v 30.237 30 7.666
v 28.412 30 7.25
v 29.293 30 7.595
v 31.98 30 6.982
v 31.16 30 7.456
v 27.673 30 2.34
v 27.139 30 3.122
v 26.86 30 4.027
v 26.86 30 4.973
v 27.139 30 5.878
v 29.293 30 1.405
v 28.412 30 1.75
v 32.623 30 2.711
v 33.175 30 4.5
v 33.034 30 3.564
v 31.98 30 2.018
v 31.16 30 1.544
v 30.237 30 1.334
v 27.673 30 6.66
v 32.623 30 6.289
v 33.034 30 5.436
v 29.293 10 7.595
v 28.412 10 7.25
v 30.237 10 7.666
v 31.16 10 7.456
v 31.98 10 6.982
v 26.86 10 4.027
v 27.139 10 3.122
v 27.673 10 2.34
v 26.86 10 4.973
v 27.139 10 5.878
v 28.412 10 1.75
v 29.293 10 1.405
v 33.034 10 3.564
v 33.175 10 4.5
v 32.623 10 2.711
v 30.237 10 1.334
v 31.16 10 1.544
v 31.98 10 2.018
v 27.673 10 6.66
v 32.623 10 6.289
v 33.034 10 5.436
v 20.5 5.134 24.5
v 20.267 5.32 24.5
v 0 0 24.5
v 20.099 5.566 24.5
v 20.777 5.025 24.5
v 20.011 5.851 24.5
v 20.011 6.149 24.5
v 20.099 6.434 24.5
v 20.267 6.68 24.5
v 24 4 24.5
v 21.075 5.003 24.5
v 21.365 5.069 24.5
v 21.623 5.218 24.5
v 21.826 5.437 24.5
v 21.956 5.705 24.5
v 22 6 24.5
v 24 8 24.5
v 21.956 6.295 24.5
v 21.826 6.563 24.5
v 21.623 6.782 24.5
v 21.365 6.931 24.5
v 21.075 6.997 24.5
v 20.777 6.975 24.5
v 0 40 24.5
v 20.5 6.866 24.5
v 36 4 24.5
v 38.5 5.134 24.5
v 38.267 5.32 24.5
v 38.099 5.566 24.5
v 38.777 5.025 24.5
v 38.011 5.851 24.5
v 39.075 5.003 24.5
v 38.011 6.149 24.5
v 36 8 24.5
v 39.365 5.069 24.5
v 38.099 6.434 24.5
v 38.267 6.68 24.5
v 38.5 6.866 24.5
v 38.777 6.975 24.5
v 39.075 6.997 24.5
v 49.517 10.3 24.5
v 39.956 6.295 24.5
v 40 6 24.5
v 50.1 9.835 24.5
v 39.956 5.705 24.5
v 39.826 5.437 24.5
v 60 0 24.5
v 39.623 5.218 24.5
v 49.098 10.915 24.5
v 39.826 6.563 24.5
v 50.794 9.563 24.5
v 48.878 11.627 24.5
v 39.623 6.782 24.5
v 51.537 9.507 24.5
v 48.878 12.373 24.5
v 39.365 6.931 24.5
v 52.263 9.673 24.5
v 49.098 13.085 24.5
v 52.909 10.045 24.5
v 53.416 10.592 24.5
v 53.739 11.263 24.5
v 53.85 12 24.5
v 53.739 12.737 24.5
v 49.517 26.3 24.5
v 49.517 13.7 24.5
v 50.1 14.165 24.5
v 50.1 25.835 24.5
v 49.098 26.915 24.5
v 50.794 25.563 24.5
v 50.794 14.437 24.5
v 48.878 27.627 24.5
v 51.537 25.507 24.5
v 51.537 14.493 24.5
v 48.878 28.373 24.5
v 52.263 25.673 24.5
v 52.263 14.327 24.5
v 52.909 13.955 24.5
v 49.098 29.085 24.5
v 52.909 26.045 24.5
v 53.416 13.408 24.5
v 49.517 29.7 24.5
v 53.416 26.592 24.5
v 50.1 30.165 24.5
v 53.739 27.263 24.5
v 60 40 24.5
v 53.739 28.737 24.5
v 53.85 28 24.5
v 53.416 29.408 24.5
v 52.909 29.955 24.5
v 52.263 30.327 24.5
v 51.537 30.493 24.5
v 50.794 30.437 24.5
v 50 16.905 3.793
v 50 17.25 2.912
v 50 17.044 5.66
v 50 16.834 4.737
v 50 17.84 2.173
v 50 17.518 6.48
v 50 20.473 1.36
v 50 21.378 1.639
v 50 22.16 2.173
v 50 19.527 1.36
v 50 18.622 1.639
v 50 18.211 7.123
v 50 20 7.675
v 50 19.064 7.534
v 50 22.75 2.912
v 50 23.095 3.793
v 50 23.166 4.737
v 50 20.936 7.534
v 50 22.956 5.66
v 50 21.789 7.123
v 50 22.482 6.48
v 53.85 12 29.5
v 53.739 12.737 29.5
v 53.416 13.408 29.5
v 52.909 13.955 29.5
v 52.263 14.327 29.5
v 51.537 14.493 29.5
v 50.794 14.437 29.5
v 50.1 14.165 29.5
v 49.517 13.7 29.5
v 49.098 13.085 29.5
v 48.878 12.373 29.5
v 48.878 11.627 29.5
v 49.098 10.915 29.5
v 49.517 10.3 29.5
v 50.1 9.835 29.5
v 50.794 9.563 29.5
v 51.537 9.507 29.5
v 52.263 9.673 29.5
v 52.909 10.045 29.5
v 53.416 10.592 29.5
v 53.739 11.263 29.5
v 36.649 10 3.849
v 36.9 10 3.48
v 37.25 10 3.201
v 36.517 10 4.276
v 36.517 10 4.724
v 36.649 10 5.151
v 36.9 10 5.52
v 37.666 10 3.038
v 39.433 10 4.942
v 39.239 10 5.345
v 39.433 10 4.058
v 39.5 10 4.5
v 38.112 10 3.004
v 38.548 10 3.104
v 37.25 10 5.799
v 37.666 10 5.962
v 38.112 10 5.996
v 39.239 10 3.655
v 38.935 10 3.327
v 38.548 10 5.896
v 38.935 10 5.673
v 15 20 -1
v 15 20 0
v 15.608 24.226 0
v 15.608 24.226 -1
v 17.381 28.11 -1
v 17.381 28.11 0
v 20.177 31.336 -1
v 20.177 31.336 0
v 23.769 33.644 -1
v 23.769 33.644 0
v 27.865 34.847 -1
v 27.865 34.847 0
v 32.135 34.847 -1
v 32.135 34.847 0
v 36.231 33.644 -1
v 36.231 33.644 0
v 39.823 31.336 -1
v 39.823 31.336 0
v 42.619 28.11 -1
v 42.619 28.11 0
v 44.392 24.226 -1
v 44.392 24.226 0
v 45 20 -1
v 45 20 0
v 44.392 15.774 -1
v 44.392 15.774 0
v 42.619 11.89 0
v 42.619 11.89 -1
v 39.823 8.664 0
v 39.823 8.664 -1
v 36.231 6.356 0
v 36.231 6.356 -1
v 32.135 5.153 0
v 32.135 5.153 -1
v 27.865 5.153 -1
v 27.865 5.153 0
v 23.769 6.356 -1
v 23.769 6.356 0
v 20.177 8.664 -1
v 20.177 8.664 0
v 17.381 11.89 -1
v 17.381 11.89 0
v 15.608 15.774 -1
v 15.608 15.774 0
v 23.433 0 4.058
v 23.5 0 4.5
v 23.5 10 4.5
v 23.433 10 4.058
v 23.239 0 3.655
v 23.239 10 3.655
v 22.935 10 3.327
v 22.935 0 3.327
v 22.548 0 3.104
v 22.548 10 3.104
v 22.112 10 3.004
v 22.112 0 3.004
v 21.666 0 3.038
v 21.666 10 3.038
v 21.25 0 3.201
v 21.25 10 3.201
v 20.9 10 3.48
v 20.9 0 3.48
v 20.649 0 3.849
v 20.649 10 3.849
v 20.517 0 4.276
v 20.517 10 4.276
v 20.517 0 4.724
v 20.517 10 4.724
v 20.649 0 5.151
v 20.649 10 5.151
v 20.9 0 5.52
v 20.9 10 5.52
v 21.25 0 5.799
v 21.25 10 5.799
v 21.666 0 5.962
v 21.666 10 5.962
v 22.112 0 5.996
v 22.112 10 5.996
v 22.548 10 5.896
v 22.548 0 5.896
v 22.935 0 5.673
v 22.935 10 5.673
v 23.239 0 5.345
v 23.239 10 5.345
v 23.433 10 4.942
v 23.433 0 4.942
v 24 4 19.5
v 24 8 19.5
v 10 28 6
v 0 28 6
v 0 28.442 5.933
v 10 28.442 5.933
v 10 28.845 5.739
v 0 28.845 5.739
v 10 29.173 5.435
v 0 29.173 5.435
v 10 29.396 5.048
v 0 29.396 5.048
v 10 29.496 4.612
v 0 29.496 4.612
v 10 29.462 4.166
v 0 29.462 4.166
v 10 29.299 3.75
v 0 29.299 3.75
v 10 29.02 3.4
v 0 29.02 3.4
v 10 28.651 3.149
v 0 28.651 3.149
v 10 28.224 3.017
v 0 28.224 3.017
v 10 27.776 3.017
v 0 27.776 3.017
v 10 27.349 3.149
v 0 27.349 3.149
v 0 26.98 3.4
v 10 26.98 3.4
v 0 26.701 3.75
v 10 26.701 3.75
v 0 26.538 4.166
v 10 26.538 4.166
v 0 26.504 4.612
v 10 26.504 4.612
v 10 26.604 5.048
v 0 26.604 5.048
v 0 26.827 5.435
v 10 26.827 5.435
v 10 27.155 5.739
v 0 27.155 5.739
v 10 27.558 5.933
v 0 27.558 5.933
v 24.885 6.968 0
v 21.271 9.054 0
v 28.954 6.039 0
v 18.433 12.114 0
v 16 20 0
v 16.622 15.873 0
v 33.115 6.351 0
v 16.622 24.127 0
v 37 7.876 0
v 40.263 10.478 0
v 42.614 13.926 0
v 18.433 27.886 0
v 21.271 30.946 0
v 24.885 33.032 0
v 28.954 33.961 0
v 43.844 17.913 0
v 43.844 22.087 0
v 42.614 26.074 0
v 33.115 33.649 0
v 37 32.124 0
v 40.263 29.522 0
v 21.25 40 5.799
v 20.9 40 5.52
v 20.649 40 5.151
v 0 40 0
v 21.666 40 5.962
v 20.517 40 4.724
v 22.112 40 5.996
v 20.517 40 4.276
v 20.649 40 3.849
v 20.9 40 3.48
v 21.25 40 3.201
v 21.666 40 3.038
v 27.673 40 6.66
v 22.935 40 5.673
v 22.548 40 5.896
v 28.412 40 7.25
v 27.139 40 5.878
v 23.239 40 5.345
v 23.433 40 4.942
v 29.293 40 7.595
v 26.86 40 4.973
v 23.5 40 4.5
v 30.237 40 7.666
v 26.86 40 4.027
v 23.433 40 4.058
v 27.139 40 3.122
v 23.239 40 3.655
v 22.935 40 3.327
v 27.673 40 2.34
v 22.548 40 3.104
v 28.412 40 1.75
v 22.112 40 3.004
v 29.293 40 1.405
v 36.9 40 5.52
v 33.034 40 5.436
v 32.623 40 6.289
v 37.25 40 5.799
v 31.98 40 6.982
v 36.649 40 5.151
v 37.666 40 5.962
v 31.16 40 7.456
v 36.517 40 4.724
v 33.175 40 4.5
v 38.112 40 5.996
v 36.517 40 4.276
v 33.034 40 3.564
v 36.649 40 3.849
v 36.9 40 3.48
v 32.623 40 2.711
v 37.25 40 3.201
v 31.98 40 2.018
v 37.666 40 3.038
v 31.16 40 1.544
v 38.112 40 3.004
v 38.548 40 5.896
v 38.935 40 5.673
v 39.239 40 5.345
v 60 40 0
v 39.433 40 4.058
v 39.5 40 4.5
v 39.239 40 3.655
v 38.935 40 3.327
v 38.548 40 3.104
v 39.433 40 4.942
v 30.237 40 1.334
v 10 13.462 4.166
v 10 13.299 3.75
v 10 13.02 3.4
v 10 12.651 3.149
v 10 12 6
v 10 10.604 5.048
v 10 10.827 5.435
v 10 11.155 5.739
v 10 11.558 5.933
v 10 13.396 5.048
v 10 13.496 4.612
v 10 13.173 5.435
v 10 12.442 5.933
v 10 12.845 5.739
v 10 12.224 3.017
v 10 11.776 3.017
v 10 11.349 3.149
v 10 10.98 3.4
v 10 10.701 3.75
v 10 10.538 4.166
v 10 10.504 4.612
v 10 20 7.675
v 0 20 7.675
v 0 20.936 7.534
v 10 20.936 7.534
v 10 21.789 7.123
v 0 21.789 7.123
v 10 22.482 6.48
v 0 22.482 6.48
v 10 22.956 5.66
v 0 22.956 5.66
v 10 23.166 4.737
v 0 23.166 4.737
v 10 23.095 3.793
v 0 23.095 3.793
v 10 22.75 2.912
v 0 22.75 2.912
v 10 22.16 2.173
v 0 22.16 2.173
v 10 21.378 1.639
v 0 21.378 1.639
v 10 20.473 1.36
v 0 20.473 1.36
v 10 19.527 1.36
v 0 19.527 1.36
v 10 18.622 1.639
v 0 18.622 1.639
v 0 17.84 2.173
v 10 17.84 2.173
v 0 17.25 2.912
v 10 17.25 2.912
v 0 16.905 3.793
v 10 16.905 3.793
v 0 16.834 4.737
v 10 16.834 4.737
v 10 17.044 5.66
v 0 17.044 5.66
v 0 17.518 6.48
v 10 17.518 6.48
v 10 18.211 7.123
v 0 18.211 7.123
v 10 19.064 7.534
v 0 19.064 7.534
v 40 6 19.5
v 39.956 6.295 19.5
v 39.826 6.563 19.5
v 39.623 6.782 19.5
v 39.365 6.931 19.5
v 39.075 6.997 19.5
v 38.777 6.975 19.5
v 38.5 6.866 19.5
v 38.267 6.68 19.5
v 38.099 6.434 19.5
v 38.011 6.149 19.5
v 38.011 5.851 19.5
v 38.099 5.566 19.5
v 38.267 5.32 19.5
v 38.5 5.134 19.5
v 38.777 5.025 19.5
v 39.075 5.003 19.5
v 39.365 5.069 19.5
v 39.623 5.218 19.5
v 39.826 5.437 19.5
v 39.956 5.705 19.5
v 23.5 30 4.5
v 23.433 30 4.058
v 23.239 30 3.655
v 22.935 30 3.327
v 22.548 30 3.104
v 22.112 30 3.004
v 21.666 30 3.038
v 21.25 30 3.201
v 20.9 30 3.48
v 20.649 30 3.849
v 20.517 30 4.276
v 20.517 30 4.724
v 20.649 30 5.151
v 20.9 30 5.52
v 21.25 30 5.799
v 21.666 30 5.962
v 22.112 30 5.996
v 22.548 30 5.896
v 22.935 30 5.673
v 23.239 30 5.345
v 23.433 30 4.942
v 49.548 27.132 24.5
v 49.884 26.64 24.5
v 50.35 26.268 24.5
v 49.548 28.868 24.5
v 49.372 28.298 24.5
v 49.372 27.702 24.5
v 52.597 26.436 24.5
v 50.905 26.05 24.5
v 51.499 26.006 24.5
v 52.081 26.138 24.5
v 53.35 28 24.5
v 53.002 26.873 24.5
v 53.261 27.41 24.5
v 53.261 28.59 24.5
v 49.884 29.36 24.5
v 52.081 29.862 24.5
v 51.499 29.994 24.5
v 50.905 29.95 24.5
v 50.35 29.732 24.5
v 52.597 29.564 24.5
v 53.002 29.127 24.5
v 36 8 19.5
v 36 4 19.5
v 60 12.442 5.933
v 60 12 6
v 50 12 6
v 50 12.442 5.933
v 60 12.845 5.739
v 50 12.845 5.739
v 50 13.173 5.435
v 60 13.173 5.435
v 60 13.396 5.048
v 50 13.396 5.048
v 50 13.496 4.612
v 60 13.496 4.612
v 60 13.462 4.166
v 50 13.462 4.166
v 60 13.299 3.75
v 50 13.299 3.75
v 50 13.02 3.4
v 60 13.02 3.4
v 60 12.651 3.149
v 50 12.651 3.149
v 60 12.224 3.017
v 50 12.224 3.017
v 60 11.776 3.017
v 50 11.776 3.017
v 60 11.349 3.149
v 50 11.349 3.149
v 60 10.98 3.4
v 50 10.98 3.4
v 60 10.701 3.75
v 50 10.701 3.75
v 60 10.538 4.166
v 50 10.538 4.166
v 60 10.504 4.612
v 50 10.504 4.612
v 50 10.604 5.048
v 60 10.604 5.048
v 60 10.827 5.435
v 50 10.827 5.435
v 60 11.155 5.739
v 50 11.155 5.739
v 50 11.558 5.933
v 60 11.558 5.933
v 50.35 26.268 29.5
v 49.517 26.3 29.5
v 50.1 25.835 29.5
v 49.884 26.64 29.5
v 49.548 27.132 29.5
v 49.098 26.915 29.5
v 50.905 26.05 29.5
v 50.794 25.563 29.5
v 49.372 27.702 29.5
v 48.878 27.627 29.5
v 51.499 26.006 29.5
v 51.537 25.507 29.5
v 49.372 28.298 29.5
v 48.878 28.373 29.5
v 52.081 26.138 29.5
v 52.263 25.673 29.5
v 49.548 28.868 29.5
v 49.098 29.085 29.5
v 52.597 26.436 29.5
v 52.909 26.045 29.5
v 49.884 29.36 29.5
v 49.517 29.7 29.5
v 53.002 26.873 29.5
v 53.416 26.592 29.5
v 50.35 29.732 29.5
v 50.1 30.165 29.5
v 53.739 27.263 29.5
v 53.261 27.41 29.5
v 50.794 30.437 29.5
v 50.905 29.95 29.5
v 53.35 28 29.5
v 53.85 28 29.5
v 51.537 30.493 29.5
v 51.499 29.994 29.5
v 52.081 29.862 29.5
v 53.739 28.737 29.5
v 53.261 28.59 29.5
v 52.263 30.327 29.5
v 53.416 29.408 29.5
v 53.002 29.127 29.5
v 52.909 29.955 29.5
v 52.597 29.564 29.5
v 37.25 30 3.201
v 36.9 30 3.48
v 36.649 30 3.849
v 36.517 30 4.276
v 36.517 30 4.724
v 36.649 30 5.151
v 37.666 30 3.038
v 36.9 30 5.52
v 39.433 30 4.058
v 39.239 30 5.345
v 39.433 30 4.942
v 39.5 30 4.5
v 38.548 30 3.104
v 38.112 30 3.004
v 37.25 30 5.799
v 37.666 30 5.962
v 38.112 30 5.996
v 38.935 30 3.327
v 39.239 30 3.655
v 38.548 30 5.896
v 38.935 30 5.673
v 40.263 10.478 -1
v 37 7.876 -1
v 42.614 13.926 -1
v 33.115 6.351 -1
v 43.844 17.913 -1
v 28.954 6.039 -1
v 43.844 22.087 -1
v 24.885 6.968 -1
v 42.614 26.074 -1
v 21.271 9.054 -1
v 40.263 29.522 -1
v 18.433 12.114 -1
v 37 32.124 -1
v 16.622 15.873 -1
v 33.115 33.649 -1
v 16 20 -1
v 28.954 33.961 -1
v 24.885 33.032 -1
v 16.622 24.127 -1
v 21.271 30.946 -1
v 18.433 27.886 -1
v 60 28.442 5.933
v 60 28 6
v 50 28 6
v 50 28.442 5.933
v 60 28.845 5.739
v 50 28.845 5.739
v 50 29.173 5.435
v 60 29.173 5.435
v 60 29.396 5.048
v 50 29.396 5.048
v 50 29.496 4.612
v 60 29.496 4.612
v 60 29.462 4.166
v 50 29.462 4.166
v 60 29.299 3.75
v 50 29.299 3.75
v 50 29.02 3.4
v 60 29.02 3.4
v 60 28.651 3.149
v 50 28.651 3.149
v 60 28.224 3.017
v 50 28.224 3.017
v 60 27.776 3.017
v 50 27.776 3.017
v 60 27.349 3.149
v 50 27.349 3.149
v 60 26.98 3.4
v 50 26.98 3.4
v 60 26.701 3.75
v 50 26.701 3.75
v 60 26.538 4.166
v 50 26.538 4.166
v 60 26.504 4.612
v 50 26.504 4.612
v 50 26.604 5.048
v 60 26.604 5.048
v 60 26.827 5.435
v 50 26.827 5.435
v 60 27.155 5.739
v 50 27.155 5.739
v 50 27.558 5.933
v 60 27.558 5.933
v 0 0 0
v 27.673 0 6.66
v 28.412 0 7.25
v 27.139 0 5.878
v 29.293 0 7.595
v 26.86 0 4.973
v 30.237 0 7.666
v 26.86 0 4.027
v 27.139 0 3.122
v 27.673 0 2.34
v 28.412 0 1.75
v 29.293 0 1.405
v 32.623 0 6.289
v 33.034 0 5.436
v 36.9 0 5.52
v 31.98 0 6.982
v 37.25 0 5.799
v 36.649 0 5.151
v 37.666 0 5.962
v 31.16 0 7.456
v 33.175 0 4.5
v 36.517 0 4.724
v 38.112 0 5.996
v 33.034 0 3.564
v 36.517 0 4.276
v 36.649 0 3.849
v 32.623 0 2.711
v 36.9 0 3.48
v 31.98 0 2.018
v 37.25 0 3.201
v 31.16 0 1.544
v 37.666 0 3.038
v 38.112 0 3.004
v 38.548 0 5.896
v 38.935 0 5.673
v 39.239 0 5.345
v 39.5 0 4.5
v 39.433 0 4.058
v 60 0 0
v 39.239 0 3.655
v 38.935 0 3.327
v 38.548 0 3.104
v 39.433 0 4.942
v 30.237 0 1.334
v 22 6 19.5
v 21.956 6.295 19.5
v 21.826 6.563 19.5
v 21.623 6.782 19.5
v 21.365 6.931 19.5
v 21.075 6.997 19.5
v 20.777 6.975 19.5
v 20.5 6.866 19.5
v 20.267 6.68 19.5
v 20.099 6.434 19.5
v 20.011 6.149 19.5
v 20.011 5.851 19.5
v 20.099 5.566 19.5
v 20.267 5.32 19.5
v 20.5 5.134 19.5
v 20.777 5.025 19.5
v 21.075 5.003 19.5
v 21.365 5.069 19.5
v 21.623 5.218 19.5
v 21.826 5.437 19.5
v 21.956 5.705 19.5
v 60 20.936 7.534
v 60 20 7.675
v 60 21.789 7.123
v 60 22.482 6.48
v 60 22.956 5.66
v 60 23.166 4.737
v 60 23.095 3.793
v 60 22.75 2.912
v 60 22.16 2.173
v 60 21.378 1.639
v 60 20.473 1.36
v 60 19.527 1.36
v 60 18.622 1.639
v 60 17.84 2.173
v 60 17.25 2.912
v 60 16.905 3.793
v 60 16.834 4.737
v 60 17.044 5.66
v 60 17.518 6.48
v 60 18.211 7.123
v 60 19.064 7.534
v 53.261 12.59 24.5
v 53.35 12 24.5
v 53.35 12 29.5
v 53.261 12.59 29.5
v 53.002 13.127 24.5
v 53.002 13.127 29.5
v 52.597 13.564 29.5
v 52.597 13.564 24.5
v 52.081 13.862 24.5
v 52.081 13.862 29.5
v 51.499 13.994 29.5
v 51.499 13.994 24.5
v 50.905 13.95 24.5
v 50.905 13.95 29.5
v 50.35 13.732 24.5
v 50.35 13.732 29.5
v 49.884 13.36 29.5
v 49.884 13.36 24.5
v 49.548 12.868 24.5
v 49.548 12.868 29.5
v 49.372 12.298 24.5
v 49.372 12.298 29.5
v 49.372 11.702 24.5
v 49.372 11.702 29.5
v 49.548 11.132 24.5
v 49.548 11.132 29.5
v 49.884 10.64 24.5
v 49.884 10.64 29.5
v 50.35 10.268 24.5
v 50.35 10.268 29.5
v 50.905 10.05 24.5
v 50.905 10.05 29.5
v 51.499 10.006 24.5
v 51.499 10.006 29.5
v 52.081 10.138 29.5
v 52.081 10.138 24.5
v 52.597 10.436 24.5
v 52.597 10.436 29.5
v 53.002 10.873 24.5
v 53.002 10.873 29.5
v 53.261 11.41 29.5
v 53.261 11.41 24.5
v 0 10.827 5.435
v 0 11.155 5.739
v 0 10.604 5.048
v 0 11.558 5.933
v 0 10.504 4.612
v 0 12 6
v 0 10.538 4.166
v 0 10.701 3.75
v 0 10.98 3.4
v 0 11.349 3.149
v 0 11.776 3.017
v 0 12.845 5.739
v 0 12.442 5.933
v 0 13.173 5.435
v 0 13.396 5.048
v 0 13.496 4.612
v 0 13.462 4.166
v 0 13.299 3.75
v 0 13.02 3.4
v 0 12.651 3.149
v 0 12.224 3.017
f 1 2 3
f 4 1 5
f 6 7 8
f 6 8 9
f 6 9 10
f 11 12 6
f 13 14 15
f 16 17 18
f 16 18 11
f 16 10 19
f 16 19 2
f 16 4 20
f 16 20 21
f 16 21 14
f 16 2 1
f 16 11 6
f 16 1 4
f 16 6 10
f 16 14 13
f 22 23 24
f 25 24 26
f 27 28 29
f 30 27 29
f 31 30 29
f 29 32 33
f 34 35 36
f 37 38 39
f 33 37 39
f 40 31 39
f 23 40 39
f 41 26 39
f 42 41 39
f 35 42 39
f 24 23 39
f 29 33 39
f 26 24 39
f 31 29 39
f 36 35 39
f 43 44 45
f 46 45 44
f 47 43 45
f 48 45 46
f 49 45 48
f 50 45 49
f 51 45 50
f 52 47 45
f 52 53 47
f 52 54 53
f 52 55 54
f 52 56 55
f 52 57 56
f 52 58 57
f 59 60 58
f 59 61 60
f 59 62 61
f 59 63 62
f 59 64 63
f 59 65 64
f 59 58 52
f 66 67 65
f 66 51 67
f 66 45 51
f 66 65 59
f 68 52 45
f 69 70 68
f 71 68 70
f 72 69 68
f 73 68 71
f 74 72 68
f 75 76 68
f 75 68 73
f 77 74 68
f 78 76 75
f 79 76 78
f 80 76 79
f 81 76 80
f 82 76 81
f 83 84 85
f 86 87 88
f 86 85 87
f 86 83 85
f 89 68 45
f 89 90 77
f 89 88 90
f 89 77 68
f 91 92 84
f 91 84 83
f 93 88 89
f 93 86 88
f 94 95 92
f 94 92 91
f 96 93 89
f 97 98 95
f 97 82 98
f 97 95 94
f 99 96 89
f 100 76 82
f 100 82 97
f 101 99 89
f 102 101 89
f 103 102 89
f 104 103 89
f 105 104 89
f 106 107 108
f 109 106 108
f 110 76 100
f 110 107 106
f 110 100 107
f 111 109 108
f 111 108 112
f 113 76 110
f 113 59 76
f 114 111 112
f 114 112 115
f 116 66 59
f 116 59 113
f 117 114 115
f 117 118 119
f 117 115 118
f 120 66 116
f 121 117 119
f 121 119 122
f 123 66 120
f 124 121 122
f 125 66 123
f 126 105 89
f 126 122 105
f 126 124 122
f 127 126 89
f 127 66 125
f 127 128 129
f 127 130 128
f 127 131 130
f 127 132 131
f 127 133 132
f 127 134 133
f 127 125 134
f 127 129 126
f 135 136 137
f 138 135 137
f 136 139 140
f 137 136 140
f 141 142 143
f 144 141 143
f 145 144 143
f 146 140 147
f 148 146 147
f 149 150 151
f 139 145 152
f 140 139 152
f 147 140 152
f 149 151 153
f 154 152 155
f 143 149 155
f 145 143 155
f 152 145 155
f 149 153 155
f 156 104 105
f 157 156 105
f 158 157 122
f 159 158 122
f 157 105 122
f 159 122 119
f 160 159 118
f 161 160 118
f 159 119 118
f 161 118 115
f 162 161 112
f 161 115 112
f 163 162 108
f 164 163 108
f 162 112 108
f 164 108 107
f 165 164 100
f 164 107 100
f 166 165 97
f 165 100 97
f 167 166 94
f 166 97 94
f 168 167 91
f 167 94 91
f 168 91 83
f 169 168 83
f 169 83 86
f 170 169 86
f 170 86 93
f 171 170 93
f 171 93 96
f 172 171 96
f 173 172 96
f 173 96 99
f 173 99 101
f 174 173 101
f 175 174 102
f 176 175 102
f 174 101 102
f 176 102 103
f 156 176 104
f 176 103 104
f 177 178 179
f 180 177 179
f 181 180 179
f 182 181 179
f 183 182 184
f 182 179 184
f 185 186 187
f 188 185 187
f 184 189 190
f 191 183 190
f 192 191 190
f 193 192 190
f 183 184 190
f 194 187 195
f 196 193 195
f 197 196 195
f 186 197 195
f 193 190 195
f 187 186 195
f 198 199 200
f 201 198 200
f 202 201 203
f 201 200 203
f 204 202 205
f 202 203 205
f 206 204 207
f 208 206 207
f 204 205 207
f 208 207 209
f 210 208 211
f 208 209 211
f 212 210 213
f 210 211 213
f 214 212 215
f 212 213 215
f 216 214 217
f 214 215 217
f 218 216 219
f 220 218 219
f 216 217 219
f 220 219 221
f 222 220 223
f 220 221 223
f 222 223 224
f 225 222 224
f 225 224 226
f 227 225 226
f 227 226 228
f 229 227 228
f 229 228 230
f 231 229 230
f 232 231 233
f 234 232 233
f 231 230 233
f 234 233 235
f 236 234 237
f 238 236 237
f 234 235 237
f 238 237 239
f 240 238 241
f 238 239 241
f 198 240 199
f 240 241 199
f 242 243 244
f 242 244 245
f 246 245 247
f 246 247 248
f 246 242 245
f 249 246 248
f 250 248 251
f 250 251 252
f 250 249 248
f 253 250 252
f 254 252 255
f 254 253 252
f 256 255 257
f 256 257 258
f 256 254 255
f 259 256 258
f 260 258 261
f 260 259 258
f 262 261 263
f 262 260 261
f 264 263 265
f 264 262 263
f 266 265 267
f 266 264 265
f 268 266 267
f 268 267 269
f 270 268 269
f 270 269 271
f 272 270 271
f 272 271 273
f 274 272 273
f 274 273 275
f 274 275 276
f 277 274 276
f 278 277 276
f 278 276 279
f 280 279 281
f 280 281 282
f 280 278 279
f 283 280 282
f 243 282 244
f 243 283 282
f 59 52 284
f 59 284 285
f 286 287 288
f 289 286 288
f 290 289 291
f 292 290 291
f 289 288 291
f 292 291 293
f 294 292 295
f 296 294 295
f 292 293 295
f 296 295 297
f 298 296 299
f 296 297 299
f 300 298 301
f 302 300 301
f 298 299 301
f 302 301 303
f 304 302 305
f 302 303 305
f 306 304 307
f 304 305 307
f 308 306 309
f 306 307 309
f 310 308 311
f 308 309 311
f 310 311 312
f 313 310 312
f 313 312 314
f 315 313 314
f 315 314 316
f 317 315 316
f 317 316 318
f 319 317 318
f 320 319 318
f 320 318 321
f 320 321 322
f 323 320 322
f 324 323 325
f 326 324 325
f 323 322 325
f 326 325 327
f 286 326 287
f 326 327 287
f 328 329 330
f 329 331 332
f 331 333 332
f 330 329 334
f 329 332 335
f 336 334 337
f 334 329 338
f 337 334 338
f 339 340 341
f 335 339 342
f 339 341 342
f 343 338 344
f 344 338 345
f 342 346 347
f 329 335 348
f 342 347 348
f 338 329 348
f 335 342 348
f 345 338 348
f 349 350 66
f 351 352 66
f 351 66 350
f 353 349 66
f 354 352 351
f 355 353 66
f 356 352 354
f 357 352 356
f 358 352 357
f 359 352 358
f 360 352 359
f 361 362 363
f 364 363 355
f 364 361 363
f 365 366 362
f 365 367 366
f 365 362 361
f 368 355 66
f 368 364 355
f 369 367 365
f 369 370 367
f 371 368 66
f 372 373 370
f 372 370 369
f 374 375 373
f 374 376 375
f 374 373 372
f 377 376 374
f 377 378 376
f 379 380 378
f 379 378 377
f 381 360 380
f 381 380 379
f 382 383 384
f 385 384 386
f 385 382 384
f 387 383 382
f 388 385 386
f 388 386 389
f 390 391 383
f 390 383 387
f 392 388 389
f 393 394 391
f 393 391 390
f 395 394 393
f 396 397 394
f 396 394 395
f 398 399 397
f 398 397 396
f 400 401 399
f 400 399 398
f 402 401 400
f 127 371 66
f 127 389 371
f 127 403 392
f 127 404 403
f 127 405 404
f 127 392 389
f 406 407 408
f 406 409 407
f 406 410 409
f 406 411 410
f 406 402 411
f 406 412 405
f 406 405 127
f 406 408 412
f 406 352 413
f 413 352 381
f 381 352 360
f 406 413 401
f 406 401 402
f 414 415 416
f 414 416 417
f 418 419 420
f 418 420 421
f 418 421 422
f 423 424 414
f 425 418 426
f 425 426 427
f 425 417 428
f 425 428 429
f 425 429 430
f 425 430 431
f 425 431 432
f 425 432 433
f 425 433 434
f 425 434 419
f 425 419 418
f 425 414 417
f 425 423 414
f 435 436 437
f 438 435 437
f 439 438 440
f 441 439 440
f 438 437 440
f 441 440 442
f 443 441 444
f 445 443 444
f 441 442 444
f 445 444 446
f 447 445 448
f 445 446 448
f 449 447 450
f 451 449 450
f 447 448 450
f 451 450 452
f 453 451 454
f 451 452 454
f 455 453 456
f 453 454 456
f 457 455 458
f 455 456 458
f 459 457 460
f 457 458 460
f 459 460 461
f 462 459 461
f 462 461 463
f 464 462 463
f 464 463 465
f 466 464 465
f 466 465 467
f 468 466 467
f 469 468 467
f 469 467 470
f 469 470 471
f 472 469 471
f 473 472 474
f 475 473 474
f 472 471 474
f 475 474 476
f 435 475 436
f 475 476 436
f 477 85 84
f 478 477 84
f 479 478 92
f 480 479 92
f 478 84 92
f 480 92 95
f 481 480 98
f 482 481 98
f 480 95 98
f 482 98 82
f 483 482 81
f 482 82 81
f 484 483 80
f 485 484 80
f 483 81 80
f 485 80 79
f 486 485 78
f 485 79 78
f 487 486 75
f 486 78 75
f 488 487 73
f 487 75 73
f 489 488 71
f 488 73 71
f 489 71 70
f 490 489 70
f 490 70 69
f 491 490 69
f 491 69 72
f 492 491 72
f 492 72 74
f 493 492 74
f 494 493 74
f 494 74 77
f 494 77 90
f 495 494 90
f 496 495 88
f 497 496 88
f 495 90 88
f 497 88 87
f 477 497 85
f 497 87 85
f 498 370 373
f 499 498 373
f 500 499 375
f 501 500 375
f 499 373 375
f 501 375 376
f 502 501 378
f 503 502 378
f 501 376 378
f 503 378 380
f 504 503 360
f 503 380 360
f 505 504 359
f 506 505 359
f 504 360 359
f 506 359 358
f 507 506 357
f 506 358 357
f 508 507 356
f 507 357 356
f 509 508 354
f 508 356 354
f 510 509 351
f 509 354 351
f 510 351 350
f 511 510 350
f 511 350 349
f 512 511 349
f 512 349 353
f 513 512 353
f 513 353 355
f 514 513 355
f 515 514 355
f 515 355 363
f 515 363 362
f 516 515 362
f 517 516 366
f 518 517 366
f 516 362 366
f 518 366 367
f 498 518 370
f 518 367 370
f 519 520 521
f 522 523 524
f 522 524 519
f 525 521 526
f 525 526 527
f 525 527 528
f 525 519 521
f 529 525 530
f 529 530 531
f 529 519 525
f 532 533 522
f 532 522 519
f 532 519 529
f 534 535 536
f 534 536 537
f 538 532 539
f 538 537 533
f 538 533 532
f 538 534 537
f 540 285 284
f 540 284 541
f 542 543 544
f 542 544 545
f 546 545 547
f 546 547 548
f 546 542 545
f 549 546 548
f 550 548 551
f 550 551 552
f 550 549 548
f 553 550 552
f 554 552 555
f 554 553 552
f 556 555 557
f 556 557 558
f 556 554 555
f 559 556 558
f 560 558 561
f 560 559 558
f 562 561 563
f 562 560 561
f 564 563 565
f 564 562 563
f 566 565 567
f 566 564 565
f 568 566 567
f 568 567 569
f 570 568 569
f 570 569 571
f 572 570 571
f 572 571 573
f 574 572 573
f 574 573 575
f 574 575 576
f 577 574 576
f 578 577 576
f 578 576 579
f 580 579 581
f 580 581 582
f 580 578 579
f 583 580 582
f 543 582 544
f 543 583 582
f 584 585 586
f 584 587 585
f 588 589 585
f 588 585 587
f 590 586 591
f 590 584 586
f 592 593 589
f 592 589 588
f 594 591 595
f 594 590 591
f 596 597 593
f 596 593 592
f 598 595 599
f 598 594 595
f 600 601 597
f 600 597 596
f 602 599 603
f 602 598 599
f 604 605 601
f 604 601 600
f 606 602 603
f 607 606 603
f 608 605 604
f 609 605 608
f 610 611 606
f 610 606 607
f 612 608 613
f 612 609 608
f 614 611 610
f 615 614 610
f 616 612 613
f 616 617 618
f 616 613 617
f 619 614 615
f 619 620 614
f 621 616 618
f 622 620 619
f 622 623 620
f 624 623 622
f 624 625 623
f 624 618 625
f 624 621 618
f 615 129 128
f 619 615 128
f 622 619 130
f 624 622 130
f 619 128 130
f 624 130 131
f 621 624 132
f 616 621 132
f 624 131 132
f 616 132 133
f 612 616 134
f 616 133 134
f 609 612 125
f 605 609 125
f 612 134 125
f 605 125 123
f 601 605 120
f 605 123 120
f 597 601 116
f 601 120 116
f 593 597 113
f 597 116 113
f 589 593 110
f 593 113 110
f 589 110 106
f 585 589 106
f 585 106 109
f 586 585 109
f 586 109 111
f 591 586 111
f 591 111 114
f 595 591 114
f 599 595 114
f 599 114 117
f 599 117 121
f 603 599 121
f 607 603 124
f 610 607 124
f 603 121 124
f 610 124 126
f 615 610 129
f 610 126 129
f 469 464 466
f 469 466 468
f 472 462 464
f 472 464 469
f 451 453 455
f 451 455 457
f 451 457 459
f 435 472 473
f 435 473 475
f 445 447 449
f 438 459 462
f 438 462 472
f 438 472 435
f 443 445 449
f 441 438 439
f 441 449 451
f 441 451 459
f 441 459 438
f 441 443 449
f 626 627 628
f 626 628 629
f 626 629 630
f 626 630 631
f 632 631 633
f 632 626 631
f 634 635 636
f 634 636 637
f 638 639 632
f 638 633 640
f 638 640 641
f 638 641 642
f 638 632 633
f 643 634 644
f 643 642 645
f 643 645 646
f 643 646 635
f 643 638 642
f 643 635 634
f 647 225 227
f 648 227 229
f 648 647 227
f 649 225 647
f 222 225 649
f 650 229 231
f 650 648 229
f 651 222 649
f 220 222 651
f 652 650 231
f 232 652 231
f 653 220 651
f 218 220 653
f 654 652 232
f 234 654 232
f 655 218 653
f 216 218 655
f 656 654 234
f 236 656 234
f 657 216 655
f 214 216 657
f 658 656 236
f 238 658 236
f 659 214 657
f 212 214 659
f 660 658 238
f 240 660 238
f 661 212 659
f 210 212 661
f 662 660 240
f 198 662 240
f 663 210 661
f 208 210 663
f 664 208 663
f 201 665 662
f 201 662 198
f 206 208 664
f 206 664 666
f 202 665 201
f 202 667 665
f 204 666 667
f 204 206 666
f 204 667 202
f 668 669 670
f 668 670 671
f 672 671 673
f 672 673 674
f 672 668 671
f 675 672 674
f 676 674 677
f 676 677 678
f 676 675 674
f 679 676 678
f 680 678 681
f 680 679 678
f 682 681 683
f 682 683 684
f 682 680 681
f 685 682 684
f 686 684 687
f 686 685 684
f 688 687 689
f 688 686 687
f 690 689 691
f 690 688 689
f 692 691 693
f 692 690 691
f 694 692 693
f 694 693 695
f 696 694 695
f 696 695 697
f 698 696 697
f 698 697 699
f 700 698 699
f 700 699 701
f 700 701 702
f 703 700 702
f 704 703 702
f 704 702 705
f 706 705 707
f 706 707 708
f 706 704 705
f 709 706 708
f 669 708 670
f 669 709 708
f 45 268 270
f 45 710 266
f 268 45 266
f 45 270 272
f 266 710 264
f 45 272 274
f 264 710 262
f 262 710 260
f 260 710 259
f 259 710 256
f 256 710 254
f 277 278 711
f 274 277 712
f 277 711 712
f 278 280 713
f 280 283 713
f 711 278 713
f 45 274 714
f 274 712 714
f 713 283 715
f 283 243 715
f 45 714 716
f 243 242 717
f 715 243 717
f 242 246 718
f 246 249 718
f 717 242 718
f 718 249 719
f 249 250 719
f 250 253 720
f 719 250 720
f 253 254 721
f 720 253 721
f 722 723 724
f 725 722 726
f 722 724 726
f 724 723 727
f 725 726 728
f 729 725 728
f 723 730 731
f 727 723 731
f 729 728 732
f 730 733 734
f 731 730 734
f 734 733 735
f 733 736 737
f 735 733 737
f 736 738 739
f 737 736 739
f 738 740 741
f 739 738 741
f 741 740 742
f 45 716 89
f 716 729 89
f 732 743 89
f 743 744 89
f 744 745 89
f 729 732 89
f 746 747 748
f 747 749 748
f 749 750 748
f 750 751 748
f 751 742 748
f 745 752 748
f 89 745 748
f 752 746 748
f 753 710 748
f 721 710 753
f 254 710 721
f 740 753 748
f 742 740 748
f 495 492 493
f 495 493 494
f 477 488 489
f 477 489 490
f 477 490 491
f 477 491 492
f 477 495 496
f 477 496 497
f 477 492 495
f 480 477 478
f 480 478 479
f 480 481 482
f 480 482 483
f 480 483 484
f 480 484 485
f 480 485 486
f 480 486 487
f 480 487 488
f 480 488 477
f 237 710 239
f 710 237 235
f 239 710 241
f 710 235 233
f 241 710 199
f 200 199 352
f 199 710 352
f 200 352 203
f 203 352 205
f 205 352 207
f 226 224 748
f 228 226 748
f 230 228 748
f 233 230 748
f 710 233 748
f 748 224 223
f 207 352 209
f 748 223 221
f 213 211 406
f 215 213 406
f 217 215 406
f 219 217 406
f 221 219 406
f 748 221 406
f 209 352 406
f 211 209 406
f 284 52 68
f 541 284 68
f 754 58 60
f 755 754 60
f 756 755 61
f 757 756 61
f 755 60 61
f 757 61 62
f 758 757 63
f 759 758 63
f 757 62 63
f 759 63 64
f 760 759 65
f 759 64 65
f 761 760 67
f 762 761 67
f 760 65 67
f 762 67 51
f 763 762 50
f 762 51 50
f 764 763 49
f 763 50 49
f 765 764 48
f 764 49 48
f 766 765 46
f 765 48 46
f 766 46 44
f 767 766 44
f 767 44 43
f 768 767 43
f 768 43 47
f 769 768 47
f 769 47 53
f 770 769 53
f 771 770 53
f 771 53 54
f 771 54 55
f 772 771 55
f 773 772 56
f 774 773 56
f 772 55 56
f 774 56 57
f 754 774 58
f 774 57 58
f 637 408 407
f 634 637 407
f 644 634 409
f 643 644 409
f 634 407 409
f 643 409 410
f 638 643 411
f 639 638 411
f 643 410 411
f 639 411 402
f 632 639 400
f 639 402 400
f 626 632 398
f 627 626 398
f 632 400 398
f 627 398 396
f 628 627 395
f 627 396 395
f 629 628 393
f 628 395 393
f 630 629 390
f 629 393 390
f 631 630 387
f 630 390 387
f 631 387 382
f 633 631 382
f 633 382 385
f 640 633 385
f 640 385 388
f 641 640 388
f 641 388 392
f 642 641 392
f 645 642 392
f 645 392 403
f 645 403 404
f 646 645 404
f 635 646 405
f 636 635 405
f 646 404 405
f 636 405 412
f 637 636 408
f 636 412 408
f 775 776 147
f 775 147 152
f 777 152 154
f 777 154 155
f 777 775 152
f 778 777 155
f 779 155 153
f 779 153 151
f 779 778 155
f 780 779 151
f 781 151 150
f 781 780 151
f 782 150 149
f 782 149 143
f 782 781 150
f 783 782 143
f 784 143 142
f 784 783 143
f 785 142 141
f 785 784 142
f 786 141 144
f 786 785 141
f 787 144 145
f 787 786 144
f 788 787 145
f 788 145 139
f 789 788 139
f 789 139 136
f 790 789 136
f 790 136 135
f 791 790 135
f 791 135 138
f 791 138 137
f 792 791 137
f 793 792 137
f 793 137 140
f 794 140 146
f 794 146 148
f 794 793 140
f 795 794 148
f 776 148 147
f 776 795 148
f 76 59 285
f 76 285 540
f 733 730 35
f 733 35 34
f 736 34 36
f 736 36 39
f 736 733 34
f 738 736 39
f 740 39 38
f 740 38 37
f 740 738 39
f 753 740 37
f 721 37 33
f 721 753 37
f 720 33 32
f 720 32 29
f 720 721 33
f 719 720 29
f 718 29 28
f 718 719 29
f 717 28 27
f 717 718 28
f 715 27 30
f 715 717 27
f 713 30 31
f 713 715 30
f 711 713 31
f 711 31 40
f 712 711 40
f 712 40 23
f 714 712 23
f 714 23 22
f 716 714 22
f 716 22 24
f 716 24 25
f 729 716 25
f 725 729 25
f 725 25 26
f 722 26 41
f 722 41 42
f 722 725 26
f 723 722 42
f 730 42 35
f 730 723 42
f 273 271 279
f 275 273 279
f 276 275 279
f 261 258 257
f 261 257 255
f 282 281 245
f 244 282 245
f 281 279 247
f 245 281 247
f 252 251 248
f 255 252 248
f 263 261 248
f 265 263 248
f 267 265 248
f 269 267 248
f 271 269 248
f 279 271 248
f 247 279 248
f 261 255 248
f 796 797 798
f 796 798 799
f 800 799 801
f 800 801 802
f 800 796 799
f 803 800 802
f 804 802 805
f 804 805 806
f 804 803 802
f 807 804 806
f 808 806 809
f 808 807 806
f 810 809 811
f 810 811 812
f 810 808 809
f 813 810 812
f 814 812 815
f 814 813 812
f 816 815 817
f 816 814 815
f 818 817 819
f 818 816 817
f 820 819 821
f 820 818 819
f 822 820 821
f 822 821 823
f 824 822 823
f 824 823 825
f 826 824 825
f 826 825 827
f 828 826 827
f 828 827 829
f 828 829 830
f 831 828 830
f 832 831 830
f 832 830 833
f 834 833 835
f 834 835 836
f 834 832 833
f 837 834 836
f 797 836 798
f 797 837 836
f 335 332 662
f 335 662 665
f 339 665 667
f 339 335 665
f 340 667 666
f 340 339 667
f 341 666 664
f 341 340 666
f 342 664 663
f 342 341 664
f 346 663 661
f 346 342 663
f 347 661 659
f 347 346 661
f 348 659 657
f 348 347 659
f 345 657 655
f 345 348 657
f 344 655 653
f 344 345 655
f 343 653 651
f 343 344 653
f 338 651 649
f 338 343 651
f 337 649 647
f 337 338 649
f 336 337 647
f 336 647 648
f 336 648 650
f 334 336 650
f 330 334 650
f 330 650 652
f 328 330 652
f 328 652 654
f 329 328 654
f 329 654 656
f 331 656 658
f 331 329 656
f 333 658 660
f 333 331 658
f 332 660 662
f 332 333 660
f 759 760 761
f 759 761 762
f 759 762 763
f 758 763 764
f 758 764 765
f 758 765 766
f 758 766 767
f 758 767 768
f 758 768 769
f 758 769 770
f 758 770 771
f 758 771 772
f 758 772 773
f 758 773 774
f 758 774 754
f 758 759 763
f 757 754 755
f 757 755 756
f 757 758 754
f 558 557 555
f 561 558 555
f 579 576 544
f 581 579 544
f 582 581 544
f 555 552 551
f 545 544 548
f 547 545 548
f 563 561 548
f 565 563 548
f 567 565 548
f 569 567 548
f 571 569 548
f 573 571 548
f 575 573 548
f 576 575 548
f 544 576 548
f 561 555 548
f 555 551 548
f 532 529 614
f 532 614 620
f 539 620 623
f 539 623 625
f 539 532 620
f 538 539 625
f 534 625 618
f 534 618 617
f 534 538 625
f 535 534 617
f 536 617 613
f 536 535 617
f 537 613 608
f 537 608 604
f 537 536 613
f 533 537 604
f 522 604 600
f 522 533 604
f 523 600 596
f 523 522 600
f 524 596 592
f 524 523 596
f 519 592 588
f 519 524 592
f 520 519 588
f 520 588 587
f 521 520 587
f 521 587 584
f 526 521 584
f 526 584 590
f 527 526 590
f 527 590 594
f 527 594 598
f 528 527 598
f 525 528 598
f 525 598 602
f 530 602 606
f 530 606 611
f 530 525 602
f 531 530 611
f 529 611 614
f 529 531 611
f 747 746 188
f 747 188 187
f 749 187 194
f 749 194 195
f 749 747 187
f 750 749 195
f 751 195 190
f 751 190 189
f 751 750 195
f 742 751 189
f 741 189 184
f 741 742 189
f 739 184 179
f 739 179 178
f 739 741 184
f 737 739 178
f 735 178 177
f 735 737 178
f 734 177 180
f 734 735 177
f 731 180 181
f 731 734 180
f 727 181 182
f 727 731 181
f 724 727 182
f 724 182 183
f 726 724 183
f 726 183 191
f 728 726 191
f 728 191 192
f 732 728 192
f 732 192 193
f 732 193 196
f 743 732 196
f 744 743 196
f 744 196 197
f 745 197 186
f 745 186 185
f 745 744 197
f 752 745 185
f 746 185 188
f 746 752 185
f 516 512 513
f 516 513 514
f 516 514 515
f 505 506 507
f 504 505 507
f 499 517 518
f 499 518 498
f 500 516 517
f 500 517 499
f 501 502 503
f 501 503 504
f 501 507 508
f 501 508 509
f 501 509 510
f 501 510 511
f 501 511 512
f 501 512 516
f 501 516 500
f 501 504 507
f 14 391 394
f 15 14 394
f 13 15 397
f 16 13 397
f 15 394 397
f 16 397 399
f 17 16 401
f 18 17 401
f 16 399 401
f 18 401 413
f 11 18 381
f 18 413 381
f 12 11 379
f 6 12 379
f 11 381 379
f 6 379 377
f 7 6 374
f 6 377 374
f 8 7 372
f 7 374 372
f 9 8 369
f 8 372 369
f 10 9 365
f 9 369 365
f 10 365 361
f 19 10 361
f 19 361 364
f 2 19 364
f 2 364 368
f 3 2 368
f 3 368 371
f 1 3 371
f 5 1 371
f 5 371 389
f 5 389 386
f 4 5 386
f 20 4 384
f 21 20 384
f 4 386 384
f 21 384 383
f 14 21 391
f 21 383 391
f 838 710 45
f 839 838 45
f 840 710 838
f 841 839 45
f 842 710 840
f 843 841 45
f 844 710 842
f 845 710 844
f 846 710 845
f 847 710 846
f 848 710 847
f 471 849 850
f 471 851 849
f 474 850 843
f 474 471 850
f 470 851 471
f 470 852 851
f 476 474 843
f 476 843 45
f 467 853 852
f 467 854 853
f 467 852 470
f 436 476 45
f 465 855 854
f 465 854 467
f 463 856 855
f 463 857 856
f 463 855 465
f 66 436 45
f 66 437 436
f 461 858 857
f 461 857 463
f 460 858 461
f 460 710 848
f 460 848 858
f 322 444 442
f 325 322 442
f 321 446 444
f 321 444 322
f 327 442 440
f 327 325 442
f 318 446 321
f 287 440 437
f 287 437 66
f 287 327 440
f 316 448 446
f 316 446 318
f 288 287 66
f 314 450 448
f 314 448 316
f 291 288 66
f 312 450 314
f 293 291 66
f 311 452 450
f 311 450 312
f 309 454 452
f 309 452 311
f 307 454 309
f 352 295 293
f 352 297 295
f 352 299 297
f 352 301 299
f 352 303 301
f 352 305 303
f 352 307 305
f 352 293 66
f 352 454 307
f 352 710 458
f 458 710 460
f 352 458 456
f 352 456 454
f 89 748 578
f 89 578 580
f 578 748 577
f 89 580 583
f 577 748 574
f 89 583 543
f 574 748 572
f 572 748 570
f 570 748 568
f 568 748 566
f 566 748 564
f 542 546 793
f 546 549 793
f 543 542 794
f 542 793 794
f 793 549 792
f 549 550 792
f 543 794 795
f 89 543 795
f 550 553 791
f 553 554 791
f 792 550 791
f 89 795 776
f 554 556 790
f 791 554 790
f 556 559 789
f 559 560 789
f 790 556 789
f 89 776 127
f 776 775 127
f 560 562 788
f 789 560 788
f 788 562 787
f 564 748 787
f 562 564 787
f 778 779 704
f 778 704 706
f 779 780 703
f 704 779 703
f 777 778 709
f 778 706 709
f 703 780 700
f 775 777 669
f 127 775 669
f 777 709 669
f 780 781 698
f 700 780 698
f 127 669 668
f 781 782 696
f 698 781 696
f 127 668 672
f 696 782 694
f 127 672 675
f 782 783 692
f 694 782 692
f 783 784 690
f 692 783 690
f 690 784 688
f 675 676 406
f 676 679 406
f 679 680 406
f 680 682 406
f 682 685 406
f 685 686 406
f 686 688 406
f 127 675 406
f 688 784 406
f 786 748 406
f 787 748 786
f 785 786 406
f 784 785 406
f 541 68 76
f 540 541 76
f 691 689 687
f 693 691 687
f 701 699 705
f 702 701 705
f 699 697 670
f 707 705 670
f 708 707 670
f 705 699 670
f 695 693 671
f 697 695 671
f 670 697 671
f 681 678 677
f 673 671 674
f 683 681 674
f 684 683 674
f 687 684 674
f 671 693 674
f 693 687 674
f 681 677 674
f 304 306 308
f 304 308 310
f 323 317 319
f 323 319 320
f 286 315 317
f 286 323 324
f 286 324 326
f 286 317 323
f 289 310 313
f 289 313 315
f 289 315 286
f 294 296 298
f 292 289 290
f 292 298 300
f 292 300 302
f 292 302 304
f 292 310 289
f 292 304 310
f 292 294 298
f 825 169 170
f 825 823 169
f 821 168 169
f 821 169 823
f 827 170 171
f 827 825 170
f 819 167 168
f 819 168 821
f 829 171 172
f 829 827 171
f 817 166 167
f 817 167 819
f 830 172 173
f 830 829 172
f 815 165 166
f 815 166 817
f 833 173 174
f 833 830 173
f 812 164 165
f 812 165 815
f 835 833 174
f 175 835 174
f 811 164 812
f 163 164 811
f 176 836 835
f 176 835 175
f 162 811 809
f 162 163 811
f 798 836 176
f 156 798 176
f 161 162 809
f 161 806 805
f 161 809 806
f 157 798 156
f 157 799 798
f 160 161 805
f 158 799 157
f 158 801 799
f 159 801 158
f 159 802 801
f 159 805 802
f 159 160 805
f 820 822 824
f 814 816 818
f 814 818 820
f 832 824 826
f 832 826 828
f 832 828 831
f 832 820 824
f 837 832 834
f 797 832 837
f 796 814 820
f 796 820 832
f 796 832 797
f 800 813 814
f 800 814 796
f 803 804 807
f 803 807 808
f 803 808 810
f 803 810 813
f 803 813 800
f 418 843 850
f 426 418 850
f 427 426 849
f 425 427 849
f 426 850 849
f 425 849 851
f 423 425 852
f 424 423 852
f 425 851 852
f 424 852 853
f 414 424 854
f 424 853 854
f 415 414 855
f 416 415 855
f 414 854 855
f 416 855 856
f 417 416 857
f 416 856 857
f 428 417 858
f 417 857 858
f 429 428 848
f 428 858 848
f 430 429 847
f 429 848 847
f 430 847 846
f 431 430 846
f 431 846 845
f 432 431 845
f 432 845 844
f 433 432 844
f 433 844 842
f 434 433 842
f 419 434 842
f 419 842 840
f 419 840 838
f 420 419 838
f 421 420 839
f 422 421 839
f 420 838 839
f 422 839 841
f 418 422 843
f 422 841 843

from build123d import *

# Parameters (mm, degrees)
SKETCH1_W           = 60
SKETCH1_H           = 40
BOSS_EXTRUDE1_DEPTH = 24.5
SKETCH2_R           = 15
SKETCH2_R_2         = 14
BOSS_EXTRUDE2_DEPTH = 1
SKETCH3_R           = 3.175
SKETCH3_R_2         = 1.5
CUT_EXTRUDE1_DEPTH  = 10
SKETCH4_R           = 3.175
SKETCH4_R_2         = 1.5
CUT_EXTRUDE2_DEPTH  = 10
SKETCH5_R           = 1
SKETCH5_W           = 12
SKETCH5_H           = 4
CUT_EXTRUDE3_DEPTH  = 5
SKETCH6_R           = 2.5
SKETCH6_R_2         = 2
BOSS_EXTRUDE4_DEPTH = 5


with BuildPart() as part:
    # Sketch1 → Boss-Extrude1 (new body)
    with BuildSketch(Plane.XY):
        with Locations((30, 20)):
            Rectangle(SKETCH1_W, SKETCH1_H)
    extrude(amount=BOSS_EXTRUDE1_DEPTH)

    # Sketch2 → Boss-Extrude2 (add)
    with BuildSketch(Plane(origin=(0, 0, 0), x_dir=(-1, 0, 0), z_dir=(0, 0, -1))):
        with Locations((-30, 20)):
            Circle(SKETCH2_R)
        with Locations((-30, 20)):
            Circle(SKETCH2_R_2, mode=Mode.SUBTRACT)
    extrude(amount=BOSS_EXTRUDE2_DEPTH)

    # Sketch3 → Cut-Extrude1 (cut)
    with BuildSketch(Plane.ZY):
        with Locations((4.5, 20)):
            Circle(SKETCH3_R)
        with Locations((4.5, 28)):
            Circle(SKETCH3_R_2)
        with Locations((4.5, 12)):
            Circle(SKETCH3_R_2)
    cut_extrude1 = extrude(amount=-CUT_EXTRUDE1_DEPTH, mode=Mode.SUBTRACT)

    # Mirror1: Cut-Extrude1 across plane
    add(cut_extrude1.mirror(Plane(origin=(30, 0, 0), x_dir=(0, 0, 1), z_dir=(1, 0, 0))), mode=Mode.SUBTRACT)

    # Sketch4 → Cut-Extrude2 (cut)
    with BuildSketch(Plane(origin=(0, 40, 0), x_dir=(1, 0, 0), z_dir=(0, 1, 0))):
        with Locations((30, -4.5)):
            Circle(SKETCH4_R)
        with Locations((38, -4.5)):
            Circle(SKETCH4_R_2)
        with Locations((22, -4.5)):
            Circle(SKETCH4_R_2)
    cut_extrude2 = extrude(amount=-CUT_EXTRUDE2_DEPTH, mode=Mode.SUBTRACT)

    # Mirror2: Cut-Extrude2 across plane
    add(cut_extrude2.mirror(Plane(origin=(0, 20, 0), x_dir=(0, 0, 1), z_dir=(0, -1, 0))), mode=Mode.SUBTRACT)

    # Sketch5 → Cut-Extrude3 (cut)
    with BuildSketch(Plane.XY.offset(24.5)):
        with Locations((21, 6)):
            Circle(SKETCH5_R)
        with Locations((39, 6)):
            Circle(SKETCH5_R)
        with Locations((30, 6)):
            Rectangle(SKETCH5_W, SKETCH5_H)
    extrude(amount=-CUT_EXTRUDE3_DEPTH, mode=Mode.SUBTRACT)

    # Sketch6 → Boss-Extrude4 (add)
    with BuildSketch(Plane.XY.offset(24.5)):
        with Locations((51.35, 12)):
            Circle(SKETCH6_R)
        with Locations((51.35, 12)):
            Circle(SKETCH6_R_2, mode=Mode.SUBTRACT)
        with Locations((51.35, 28)):
            Circle(SKETCH6_R)
        with Locations((51.35, 28)):
            Circle(SKETCH6_R_2, mode=Mode.SUBTRACT)
    extrude(amount=BOSS_EXTRUDE4_DEPTH)


solid = part.part
